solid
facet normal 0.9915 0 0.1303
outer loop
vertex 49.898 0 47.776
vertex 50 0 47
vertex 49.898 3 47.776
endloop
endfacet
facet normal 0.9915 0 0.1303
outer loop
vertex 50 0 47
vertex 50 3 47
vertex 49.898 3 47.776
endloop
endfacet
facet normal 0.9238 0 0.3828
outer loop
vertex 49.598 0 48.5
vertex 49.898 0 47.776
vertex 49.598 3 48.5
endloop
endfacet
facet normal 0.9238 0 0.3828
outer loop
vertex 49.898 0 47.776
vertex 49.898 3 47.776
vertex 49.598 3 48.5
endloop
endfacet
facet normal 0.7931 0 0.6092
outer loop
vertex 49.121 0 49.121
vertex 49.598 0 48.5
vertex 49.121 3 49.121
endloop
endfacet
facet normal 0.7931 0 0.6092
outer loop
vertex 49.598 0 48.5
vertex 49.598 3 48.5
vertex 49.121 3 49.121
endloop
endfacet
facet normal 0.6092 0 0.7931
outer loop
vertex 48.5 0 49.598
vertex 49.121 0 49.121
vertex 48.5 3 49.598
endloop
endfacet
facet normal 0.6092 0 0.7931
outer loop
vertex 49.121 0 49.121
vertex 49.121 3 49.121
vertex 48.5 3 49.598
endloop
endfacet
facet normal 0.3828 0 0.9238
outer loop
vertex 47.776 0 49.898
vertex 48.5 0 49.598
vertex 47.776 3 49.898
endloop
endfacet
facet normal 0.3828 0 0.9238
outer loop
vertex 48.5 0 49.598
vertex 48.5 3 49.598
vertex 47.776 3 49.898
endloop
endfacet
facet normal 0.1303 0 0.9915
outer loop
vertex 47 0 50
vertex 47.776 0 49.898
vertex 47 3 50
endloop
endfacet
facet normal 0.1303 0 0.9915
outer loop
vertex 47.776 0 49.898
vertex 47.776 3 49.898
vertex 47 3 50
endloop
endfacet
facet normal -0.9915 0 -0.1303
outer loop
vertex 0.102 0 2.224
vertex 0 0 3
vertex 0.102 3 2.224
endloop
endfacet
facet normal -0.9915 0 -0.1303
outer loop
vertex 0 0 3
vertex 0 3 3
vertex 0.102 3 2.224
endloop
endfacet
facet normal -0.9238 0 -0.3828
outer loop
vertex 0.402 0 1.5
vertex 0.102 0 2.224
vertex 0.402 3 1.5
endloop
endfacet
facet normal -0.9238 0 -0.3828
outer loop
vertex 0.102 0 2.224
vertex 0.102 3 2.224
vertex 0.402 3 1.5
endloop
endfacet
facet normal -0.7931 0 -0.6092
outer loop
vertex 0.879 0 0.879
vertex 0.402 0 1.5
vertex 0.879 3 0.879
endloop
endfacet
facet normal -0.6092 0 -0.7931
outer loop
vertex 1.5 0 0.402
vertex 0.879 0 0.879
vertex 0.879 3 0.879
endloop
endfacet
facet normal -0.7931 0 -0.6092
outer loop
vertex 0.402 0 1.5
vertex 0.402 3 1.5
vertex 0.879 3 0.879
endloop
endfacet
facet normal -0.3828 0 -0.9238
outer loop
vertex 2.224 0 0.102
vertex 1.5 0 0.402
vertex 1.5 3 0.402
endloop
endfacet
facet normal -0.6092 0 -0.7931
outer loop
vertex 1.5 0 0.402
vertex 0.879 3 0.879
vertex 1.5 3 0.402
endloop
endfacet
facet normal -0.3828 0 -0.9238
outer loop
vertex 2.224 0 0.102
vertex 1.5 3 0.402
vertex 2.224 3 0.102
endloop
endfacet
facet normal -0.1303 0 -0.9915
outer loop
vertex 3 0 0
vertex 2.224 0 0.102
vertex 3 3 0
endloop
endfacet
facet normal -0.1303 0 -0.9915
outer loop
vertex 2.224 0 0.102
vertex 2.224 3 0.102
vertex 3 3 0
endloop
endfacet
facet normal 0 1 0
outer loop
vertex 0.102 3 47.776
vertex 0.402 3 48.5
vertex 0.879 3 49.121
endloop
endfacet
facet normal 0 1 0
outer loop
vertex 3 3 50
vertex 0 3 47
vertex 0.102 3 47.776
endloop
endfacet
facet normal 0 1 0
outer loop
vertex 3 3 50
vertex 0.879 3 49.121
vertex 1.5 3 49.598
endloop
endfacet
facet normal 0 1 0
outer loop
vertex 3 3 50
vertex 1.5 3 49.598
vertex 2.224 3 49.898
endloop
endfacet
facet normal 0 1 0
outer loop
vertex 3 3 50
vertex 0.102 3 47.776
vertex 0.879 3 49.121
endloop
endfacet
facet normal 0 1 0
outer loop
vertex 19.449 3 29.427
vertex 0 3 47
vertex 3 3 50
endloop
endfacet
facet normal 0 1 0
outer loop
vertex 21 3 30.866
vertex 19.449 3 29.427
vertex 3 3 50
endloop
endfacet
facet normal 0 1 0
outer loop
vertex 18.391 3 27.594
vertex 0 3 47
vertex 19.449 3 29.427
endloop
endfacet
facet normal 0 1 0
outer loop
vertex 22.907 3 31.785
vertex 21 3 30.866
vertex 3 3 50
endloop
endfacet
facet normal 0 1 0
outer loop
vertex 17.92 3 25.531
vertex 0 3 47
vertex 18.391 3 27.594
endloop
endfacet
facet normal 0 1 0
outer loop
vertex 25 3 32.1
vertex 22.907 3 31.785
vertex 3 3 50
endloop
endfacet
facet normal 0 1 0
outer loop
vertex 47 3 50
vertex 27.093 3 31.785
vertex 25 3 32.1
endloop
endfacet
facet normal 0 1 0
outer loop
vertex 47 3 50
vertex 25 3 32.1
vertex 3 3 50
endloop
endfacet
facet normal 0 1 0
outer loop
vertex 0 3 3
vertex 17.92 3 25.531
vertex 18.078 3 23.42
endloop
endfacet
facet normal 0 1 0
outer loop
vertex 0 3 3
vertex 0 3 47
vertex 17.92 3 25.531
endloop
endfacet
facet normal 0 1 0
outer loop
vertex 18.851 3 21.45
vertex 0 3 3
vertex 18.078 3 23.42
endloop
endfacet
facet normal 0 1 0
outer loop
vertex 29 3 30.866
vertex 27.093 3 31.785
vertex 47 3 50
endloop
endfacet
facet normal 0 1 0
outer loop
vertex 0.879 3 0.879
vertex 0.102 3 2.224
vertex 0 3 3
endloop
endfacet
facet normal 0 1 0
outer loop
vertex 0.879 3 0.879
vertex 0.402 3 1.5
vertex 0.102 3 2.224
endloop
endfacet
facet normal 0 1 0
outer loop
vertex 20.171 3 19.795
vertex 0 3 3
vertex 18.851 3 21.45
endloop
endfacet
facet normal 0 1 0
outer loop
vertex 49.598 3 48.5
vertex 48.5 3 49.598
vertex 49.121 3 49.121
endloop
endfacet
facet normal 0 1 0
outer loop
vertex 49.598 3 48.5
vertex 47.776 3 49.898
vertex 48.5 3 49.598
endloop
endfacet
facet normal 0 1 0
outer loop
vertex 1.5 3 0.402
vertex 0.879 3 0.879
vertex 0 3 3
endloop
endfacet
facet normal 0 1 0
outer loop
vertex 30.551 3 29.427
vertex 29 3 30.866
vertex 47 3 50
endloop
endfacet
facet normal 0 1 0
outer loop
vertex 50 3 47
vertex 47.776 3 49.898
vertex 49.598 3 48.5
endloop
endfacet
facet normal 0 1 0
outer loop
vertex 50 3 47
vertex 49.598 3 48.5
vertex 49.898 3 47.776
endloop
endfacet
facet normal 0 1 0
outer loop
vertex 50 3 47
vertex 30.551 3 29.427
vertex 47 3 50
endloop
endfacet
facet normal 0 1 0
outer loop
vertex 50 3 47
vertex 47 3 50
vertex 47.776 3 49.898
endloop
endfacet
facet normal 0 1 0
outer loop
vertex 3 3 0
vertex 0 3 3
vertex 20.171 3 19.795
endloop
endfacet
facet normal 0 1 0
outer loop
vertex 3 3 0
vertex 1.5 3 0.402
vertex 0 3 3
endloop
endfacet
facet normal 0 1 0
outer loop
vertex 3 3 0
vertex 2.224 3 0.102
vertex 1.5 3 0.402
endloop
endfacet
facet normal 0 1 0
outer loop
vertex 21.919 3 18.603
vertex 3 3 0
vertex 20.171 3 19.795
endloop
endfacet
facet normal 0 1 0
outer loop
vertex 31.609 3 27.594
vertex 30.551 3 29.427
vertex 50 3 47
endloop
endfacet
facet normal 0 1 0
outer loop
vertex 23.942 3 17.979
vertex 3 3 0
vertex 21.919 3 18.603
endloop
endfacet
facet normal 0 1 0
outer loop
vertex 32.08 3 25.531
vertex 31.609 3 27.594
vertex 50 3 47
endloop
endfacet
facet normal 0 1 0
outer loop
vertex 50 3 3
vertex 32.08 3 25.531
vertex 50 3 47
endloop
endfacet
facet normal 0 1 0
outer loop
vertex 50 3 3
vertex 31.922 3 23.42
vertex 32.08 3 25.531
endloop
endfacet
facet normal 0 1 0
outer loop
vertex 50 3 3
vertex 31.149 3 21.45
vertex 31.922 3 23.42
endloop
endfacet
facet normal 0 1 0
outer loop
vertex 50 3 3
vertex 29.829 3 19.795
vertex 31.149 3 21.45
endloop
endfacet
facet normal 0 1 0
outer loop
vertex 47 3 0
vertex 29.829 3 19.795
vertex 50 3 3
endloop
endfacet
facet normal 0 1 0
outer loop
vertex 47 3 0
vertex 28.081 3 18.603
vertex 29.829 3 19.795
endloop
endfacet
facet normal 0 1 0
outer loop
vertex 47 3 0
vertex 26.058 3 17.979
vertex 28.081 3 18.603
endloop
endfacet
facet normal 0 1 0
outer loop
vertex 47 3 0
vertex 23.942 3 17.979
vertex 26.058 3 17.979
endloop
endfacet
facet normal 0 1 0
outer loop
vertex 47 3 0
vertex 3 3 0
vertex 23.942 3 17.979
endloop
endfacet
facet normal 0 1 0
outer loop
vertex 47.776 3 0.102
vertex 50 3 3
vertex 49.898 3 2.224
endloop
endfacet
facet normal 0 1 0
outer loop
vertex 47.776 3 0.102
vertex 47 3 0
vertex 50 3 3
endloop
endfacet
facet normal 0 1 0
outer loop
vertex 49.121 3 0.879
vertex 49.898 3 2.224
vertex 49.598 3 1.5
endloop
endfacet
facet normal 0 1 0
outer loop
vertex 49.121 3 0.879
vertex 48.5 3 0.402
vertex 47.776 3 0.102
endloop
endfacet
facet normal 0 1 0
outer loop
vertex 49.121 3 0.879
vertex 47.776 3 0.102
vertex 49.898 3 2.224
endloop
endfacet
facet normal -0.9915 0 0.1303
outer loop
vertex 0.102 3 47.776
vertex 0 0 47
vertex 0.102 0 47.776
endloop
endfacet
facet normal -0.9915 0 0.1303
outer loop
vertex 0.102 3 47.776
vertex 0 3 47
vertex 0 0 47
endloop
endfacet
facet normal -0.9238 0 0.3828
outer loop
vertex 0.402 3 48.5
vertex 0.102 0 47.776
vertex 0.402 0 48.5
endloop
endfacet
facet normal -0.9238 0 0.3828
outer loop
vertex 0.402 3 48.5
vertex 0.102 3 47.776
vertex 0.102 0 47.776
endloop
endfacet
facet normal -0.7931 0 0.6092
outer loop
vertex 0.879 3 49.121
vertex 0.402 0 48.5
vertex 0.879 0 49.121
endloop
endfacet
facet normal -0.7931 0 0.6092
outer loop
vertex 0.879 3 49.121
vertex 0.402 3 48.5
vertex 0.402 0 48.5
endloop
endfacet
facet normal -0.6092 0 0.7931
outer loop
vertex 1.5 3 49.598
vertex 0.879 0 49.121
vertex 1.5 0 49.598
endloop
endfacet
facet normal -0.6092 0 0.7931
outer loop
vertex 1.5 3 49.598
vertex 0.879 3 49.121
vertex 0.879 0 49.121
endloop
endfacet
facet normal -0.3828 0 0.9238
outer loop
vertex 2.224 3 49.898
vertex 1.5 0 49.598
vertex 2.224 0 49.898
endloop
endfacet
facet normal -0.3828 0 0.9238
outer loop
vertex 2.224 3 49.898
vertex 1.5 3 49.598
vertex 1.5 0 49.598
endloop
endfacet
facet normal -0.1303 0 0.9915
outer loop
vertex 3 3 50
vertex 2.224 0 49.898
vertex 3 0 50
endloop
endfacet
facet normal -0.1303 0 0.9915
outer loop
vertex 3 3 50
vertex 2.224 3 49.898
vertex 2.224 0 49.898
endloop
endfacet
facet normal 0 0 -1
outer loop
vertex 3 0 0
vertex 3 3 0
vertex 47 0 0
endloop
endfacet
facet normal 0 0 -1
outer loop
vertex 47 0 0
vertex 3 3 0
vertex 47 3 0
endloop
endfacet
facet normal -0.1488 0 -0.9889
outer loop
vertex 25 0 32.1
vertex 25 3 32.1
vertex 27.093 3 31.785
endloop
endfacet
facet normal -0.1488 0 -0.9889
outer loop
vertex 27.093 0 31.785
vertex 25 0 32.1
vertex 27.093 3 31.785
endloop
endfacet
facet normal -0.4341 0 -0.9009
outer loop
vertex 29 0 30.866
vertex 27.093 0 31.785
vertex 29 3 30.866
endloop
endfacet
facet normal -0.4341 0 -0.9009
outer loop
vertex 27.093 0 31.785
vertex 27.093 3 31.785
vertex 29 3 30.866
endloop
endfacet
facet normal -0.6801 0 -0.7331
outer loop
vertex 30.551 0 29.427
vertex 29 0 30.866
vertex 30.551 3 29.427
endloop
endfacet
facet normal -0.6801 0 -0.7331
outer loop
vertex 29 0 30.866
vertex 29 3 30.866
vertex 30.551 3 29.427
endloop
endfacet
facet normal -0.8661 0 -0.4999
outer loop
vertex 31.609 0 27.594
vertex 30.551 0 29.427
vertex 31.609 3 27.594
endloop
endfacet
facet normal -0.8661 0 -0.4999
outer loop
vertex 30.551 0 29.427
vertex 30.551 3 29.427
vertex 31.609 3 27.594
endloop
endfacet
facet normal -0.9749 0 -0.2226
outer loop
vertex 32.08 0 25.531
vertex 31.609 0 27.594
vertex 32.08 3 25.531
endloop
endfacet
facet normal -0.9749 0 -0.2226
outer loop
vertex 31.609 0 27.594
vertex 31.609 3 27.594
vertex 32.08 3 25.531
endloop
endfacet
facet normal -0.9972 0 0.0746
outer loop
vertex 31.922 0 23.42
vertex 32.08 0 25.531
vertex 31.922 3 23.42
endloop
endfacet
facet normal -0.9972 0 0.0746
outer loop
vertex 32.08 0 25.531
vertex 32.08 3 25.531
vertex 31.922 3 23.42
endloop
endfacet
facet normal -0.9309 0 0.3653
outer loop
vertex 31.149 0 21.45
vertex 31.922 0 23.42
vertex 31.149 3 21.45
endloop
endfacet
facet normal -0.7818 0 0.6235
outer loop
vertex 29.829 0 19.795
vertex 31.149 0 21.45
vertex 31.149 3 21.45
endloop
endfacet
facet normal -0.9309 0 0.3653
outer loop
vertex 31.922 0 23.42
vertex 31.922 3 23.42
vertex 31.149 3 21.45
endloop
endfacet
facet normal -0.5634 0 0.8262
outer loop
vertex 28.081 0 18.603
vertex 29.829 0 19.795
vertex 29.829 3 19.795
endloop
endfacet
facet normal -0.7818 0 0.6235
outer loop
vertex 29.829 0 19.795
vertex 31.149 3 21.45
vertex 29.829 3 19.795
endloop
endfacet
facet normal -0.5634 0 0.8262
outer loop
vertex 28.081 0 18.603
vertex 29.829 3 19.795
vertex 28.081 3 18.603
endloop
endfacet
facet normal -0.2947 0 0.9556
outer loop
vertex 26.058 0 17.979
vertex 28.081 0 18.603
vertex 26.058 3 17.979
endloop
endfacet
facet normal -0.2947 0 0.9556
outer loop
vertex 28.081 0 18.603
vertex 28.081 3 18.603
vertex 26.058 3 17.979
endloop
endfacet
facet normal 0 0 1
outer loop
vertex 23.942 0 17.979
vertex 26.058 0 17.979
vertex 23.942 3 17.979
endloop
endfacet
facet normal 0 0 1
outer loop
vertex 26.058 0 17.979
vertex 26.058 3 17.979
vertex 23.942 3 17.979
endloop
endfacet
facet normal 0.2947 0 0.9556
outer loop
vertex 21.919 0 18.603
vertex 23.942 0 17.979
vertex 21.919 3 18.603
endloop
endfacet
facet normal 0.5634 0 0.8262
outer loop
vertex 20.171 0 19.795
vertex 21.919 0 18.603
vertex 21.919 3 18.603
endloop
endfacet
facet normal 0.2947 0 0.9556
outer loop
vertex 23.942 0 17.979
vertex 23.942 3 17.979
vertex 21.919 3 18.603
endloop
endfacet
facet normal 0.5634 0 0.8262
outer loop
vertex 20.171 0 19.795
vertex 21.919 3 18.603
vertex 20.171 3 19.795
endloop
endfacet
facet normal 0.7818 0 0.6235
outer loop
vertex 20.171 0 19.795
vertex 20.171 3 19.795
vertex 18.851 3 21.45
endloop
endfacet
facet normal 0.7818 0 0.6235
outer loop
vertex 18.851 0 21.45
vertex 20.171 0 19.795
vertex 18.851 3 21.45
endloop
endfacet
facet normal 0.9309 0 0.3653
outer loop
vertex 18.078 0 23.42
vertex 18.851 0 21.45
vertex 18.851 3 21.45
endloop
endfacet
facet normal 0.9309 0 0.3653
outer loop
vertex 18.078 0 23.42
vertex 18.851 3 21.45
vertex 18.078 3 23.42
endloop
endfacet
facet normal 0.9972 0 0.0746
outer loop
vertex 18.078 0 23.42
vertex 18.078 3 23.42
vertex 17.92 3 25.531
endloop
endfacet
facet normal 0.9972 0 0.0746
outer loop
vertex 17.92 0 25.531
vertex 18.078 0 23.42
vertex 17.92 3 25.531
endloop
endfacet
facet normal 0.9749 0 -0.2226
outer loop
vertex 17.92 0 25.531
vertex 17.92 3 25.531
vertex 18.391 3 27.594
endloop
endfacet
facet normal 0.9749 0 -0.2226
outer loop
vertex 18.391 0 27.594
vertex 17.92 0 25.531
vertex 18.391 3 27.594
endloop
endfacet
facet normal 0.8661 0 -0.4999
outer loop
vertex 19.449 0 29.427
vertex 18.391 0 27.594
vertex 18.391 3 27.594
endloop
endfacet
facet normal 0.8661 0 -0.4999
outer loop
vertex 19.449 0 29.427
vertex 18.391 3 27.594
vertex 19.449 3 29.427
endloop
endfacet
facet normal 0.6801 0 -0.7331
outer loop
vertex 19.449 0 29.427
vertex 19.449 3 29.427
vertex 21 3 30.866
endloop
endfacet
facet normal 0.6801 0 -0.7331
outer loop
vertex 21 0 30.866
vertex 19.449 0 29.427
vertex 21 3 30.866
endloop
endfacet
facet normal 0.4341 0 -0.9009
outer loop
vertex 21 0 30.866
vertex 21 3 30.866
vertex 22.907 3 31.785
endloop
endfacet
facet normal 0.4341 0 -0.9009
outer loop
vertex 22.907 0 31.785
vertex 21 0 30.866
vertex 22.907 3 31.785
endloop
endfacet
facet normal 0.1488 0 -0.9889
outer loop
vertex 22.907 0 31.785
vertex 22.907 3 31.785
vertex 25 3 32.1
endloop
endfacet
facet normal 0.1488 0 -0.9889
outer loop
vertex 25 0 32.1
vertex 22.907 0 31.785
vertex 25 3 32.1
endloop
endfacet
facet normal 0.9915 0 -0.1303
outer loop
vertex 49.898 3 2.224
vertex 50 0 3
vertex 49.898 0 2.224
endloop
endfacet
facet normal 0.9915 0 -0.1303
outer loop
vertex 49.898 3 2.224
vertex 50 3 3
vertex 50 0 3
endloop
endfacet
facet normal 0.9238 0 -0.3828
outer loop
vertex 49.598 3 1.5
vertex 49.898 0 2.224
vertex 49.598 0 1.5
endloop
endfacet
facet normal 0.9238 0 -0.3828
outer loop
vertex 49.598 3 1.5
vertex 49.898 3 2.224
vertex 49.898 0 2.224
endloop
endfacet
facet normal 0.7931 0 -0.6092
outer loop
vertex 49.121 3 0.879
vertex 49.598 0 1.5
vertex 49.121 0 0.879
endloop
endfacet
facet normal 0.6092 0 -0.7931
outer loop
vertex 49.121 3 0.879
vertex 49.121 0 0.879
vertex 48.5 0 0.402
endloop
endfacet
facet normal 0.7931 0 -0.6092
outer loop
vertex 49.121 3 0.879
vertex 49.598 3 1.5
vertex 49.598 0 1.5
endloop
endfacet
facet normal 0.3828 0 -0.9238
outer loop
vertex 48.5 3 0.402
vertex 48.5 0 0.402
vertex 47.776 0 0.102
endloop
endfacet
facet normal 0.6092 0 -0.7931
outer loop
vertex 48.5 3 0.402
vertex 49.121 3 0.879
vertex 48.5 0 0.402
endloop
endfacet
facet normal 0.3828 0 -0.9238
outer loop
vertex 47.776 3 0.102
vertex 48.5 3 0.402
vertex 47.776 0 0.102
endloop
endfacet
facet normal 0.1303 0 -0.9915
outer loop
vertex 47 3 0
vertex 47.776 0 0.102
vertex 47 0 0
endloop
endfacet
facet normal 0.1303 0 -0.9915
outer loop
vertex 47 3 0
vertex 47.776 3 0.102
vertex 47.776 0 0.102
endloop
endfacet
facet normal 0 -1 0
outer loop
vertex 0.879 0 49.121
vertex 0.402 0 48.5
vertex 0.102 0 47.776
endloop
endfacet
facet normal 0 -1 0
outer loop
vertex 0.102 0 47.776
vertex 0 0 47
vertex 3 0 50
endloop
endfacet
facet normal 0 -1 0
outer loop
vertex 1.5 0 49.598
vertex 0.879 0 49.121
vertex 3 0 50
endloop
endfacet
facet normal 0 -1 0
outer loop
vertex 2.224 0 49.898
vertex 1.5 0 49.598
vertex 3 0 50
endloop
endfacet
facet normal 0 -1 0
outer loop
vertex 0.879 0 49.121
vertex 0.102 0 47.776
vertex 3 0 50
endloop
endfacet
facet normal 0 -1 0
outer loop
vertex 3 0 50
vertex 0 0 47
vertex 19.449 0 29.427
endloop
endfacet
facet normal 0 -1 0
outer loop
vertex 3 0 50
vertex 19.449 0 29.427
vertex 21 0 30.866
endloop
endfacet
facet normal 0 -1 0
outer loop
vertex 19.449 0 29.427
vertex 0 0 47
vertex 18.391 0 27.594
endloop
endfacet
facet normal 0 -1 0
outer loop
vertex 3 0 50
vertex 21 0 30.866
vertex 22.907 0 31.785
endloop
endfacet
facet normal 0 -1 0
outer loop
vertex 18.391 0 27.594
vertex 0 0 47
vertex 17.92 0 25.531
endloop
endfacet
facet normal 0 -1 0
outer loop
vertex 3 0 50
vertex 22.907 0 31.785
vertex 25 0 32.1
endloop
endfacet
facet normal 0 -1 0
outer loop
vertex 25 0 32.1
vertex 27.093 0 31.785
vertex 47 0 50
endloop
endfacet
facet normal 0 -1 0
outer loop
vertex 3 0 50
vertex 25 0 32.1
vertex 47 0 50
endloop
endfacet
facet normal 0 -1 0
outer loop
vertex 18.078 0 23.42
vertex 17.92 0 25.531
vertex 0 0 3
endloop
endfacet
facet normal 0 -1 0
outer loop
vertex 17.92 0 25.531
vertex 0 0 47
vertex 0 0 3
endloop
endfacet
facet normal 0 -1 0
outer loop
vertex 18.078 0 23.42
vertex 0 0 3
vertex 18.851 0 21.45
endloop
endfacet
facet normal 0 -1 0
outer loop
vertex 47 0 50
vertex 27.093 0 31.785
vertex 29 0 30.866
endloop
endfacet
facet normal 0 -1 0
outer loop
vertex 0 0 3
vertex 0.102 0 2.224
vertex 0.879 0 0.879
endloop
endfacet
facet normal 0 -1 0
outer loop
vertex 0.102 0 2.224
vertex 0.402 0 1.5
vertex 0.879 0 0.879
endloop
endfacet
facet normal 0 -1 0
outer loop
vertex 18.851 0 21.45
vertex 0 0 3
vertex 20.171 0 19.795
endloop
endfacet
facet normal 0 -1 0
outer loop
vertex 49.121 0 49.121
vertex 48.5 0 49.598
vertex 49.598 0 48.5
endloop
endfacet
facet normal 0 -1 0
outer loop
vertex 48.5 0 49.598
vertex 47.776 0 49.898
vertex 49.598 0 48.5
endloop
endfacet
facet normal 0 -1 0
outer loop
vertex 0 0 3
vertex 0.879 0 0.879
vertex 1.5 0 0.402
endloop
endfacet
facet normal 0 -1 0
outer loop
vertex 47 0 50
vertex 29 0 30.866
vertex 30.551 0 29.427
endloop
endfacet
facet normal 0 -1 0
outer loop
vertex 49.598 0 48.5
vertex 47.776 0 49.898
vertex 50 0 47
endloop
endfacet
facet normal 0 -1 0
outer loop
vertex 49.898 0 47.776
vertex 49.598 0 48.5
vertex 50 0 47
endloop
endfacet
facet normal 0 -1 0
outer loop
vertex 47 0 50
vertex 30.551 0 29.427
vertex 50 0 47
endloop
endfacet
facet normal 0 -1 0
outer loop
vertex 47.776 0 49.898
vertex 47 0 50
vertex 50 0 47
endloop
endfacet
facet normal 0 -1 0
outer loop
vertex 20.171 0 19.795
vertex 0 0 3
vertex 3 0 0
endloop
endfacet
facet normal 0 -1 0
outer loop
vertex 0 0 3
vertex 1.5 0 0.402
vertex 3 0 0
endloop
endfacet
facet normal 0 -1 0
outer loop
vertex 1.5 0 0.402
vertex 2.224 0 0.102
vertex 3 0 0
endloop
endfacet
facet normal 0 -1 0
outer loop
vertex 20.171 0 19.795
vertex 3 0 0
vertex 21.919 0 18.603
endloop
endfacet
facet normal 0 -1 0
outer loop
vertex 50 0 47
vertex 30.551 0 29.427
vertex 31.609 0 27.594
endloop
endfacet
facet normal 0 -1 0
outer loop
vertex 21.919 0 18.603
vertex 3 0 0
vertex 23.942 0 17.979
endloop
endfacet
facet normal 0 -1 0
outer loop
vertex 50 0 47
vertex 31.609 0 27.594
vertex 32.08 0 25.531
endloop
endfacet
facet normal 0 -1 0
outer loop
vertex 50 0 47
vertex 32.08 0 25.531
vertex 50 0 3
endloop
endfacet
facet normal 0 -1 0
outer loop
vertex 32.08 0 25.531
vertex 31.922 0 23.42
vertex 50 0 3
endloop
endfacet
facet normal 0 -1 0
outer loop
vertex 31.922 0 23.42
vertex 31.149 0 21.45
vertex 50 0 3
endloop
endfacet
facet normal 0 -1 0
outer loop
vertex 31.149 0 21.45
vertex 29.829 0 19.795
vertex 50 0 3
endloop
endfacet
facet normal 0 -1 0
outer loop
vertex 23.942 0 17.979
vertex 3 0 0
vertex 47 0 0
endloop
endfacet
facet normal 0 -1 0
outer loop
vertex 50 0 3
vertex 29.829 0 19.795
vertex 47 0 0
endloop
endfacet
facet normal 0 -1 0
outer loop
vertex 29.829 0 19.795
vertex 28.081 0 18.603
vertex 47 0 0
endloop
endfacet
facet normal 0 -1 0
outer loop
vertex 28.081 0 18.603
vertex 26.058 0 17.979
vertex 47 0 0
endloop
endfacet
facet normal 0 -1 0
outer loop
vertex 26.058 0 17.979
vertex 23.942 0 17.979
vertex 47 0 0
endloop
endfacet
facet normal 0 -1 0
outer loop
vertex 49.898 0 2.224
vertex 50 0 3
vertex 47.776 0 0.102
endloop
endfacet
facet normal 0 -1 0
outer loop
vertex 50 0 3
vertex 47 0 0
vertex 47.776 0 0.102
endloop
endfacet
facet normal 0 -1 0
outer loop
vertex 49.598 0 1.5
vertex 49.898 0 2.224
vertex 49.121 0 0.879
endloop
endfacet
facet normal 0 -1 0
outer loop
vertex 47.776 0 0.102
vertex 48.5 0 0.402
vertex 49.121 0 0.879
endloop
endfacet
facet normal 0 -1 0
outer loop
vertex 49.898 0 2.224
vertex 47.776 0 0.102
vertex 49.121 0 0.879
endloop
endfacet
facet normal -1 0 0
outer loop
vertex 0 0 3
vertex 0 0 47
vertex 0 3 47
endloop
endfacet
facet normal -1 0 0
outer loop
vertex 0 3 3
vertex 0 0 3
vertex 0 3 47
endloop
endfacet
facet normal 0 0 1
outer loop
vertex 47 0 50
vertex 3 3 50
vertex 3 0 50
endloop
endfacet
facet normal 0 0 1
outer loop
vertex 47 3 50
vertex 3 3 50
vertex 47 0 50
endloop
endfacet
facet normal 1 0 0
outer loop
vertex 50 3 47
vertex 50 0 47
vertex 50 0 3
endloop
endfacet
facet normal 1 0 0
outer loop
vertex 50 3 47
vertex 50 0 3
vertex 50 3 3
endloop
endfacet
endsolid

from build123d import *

# Parameters (mm, degrees)
SKETCH_1_W                = 50
SKETCH_1_H                = 3
BLOCKEXTRUDE_DEPTH        = 50
FILLET_2_R                = 3
SKETCH_2_R                = 7.1
COAXIAL_FEEDTHROUGH_DEPTH = 71.774289117


with BuildPart() as part:
    # 草图1 → BlockExtrude (new body)
    with BuildSketch(Plane.XY):
        with Locations((25, 1.5)):
            Rectangle(SKETCH_1_W, SKETCH_1_H)
    extrude(amount=BLOCKEXTRUDE_DEPTH)

    # Fillet 2
    fillet_2_edges = [part.edges().sort_by_distance(p)[0] for p in [
        (50, 1.5, 50),
        (0, 1.5, 50),
        (50, 1.5, 0),
        (0, 1.5, 0),
    ]]
    fillet(fillet_2_edges, radius=FILLET_2_R)

    # 草图2 → Coaxial_feedthrough (cut, through all)
    with BuildSketch(Plane(origin=(0, 3, 0), x_dir=(1, 0, 0), z_dir=(0, 1, 0))):
        with Locations(Location((25, -25, 0), (0, 0, 270))):
            Circle(SKETCH_2_R)
    extrude(amount=-COAXIAL_FEEDTHROUGH_DEPTH, mode=Mode.SUBTRACT)


solid = part.part
